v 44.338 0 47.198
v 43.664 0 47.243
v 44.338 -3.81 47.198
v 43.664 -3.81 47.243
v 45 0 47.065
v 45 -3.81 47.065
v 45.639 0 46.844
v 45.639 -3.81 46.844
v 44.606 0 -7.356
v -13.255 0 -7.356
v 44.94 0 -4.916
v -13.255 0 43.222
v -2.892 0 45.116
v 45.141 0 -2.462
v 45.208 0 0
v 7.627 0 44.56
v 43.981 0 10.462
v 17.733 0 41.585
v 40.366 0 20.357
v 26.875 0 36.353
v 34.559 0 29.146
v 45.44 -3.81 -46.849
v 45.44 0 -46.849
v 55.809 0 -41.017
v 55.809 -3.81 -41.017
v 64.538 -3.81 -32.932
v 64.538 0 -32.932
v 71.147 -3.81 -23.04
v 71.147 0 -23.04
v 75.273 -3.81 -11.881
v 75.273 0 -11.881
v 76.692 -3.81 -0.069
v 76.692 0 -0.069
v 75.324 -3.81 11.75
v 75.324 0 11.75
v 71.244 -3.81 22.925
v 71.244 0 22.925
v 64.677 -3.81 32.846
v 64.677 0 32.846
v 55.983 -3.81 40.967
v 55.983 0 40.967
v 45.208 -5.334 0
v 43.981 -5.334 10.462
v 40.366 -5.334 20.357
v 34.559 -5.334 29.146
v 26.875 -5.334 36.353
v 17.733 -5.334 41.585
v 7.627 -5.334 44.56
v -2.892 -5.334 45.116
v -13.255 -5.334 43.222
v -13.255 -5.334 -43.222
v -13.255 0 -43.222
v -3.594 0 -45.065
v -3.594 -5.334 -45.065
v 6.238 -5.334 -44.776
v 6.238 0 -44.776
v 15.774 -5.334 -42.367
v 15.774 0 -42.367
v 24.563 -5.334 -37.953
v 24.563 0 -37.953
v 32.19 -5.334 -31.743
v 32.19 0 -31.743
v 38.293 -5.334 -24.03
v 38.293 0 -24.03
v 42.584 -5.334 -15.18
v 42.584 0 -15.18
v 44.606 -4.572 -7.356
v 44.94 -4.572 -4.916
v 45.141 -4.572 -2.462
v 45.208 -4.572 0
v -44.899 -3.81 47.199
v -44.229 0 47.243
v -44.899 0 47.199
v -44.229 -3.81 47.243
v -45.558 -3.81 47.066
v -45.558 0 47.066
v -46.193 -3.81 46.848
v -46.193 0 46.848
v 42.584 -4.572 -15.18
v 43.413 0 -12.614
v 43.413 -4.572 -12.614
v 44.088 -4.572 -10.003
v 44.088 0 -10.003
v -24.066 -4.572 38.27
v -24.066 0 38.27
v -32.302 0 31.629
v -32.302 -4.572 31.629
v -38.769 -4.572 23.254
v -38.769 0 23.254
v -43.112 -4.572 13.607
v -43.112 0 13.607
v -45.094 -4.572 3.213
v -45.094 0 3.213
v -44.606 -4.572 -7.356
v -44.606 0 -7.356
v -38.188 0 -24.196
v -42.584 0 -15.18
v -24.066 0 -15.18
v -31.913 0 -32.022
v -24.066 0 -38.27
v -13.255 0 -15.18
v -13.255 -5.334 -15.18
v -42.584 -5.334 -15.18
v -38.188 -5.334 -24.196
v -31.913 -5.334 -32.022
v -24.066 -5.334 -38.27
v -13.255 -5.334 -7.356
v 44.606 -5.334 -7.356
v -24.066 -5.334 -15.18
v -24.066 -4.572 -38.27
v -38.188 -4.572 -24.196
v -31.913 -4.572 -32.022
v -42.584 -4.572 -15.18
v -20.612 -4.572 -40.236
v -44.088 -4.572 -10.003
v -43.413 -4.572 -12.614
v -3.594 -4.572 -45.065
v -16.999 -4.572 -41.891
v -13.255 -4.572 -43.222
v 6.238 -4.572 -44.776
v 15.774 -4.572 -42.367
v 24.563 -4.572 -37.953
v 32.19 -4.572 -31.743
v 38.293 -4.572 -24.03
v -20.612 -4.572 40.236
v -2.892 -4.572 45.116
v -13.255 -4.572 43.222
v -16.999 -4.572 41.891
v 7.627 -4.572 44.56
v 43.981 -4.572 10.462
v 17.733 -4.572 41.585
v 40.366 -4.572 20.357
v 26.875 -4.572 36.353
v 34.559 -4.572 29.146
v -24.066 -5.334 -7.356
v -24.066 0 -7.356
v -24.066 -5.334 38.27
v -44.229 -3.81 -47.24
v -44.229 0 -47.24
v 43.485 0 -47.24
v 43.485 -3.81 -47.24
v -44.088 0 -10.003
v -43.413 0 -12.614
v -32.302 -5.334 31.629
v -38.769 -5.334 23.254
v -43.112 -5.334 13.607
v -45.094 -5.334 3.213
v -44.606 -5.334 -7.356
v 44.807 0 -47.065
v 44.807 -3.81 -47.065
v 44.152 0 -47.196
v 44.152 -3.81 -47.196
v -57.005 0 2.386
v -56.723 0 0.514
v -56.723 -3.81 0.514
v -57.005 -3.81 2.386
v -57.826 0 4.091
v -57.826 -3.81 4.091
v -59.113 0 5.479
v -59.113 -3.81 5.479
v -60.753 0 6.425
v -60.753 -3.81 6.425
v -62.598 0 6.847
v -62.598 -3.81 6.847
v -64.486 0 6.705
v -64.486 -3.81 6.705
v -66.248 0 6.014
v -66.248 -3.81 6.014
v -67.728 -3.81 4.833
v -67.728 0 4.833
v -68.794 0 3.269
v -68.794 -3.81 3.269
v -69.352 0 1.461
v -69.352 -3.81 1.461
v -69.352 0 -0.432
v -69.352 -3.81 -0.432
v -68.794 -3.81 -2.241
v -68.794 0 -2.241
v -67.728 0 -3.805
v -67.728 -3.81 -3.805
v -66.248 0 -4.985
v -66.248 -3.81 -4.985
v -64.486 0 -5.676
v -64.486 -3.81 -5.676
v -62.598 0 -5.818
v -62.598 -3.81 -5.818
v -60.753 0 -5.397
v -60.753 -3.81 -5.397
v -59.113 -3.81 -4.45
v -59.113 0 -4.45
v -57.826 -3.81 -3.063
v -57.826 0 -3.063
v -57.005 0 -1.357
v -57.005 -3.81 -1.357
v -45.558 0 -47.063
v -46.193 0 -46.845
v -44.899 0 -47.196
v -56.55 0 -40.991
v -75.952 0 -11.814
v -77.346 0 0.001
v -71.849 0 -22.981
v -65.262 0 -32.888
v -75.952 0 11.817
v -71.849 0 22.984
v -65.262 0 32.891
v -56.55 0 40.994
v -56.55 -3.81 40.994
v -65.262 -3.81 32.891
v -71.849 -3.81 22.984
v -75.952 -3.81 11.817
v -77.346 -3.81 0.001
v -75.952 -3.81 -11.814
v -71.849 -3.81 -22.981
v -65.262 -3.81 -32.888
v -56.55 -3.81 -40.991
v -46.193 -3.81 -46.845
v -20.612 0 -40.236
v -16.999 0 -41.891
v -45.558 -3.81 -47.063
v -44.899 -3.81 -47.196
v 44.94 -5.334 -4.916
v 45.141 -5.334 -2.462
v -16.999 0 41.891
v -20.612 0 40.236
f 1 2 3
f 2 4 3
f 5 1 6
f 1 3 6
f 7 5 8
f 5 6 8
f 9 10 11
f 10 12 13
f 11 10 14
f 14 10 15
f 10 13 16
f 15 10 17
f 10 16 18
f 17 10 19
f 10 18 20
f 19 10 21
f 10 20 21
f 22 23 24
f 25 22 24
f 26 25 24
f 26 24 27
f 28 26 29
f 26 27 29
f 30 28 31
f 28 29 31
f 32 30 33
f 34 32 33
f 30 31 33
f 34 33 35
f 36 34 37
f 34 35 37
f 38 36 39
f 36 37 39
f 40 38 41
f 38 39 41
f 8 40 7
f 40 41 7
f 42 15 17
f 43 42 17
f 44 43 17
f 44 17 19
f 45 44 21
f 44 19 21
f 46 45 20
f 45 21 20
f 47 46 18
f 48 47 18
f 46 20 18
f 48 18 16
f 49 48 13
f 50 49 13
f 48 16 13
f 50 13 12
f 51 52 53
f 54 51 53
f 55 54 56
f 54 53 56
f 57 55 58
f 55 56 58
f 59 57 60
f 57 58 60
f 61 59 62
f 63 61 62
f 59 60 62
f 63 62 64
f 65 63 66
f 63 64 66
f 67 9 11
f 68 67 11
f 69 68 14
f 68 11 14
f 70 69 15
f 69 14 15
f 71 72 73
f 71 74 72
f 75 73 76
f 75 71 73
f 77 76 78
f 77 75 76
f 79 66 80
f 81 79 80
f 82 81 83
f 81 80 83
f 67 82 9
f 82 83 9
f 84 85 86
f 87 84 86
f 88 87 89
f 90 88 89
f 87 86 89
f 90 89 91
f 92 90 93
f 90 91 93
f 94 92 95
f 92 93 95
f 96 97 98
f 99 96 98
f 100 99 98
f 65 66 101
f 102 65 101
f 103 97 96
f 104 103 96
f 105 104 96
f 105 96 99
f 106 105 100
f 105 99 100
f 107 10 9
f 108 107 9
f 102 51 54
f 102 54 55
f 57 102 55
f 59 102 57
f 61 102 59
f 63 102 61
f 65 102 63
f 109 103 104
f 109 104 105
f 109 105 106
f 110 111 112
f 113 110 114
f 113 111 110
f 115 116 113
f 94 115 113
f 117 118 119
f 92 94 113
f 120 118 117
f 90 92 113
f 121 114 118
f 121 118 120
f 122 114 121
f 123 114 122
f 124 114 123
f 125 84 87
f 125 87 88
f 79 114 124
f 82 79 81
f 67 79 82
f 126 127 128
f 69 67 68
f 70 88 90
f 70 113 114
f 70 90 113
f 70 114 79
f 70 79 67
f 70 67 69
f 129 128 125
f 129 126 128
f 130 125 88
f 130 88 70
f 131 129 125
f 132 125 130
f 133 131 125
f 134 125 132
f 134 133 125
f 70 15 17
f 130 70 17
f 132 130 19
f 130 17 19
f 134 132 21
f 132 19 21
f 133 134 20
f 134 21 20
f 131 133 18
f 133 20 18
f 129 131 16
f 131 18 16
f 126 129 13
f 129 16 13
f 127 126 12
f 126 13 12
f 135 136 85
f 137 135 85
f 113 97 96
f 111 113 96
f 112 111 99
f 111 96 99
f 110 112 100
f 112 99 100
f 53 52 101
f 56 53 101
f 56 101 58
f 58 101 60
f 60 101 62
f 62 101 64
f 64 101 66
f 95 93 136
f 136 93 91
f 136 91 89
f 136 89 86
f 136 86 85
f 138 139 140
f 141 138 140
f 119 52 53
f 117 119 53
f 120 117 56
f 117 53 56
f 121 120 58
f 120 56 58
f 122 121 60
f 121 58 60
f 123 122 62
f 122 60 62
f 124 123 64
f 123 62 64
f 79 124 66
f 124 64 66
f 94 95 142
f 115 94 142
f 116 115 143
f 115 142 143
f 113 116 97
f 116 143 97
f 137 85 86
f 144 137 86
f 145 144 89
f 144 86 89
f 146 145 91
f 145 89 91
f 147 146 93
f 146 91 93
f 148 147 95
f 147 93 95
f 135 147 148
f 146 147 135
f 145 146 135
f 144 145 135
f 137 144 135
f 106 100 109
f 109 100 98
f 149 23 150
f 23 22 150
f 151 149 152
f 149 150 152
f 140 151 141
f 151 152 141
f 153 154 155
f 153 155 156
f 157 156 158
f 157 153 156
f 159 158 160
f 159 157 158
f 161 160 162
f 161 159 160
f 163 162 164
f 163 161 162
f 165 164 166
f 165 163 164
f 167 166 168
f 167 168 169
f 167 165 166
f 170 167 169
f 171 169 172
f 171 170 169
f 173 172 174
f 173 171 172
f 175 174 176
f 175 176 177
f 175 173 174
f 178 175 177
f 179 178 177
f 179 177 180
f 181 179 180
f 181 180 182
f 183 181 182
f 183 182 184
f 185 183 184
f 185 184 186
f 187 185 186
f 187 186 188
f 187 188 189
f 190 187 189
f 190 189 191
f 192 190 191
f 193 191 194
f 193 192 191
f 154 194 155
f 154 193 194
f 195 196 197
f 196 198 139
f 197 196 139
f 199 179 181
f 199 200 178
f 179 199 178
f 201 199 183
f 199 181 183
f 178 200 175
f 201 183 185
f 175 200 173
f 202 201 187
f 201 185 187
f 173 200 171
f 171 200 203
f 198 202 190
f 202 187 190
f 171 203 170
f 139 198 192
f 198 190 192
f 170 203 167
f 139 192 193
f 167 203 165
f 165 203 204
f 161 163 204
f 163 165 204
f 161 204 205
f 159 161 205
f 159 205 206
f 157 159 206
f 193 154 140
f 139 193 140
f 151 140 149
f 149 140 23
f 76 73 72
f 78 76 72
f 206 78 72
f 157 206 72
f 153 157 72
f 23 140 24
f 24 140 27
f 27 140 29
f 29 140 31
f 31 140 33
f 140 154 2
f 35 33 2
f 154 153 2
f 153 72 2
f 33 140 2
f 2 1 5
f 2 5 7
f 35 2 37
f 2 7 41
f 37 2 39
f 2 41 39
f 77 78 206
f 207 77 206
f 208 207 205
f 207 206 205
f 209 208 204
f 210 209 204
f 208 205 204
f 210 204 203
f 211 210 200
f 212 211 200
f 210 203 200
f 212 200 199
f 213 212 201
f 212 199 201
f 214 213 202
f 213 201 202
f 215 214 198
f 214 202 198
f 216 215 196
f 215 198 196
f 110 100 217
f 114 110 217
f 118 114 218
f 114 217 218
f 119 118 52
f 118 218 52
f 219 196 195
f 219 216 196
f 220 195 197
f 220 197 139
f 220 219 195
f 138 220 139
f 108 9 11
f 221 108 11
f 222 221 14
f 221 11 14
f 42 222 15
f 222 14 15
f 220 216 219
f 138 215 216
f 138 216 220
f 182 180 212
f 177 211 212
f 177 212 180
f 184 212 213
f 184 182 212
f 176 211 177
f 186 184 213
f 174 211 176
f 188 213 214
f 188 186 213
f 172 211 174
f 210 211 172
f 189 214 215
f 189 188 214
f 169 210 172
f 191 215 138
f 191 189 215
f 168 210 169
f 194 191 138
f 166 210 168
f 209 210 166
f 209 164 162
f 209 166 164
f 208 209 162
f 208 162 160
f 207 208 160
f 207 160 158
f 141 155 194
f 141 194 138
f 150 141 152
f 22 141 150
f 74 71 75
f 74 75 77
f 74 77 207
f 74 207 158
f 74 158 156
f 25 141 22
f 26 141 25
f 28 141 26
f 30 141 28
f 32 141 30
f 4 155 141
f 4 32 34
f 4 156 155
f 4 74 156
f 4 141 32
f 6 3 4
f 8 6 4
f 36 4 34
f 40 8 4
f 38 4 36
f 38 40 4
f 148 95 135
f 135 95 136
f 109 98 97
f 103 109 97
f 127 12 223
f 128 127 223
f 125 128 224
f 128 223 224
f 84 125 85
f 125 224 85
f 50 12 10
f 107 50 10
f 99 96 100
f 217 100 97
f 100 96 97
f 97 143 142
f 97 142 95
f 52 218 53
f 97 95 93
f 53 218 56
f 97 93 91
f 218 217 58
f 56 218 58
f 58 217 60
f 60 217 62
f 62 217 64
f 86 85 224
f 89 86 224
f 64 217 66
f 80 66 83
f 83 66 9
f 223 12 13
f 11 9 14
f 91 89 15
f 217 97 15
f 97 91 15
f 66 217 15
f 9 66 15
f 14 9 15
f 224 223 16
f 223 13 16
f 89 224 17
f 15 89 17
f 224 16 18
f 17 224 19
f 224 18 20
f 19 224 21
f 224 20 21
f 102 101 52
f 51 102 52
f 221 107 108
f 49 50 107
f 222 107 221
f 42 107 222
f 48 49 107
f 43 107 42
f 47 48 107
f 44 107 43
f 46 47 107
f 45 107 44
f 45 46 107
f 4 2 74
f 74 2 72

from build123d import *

# Parameters (mm, degrees)
F1_DEPTH = 5.334
F3_DEPTH = 4.572
F2_R     = 6.35
F4_DEPTH = 3.81
F5_R     = 5.08


with BuildPart() as f1:
    # F0 (on Front) → F1 (new body)
    with BuildSketch(Plane.XZ):
        with BuildLine():
            Line((-24.066022, -15.179841), (-42.583715, -15.179841))
            ThreePointArc((-42.583715, -15.179841), (-35.268128, -28.283556), (-24.066022, -38.270445))
            Line((-24.066022, -38.270445), (-24.066022, -15.179841))
        make_face()
        with BuildLine():
            ThreePointArc((-13.254738, -43.221665), (20.288746, -40.400089), (42.583715, -15.179841))
            Line((42.583715, -15.179841), (-13.254738, -15.179841))
            Line((-13.254738, -15.179841), (-13.254738, -43.221665))
        make_face()
        with BuildLine():
            ThreePointArc((44.605963, -7.355843), (45.057547, -3.690236), (45.20841, 0))
            ThreePointArc((45.20841, 0), (26.875405, 36.35262), (-13.254738, 43.221665))
            Line((-13.254738, 43.221665), (-13.254738, -7.355843))
            Line((-13.254738, -7.355843), (44.605963, -7.355843))
        make_face()
        with BuildLine():
            Line((-24.066022, -7.355843), (-24.066022, 38.270445))
            ThreePointArc((-24.066022, 38.270445), (-41.223778, 18.55803), (-44.605963, -7.355843))
            Line((-44.605963, -7.355843), (-24.066022, -7.355843))
        make_face()
    extrude(amount=F1_DEPTH)


with BuildPart() as f3:
    # F0 (on Front) → F3 (new body)
    with BuildSketch(Plane.XZ):
        with BuildLine():
            ThreePointArc((44.605963, -7.355843), (45.057547, -3.690236), (45.20841, 0))
            ThreePointArc((45.20841, 0), (26.875405, 36.35262), (-13.254738, 43.221665))
            Line((-13.254738, 43.221665), (-13.254738, -7.355843))
            Line((-13.254738, -7.355843), (44.605963, -7.355843))
        make_face()
        with BuildLine():
            Line((-13.254738, -7.355843), (-13.254738, 43.221665))
            ThreePointArc((-13.254738, 43.221665), (-18.823879, 41.103065), (-24.066022, 38.270445))
            Line((-24.066022, 38.270445), (-24.066022, -7.355843))
            Line((-24.066022, -7.355843), (-44.605963, -7.355843))
            ThreePointArc((-44.605963, -7.355843), (-43.77001, -11.313118), (-42.583715, -15.179841))
            Line((-42.583715, -15.179841), (-24.066022, -15.179841))
            Line((-24.066022, -15.179841), (-24.066022, -38.270445))
            ThreePointArc((-24.066022, -38.270445), (-18.823879, -41.103065), (-13.254738, -43.221665))
            Line((-13.254738, -43.221665), (-13.254738, -15.179841))
            Line((-13.254738, -15.179841), (42.583715, -15.179841))
            ThreePointArc((42.583715, -15.179841), (43.77001, -11.313118), (44.605963, -7.355843))
            Line((44.605963, -7.355843), (-13.254738, -7.355843))
        make_face()
        with BuildLine():
            Line((-24.066022, -7.355843), (-24.066022, 38.270445))
            ThreePointArc((-24.066022, 38.270445), (-41.223778, 18.55803), (-44.605963, -7.355843))
            Line((-44.605963, -7.355843), (-24.066022, -7.355843))
        make_face()
        with BuildLine():
            ThreePointArc((-13.254738, -43.221665), (20.288746, -40.400089), (42.583715, -15.179841))
            Line((42.583715, -15.179841), (-13.254738, -15.179841))
            Line((-13.254738, -15.179841), (-13.254738, -43.221665))
        make_face()
        with BuildLine():
            Line((-24.066022, -15.179841), (-42.583715, -15.179841))
            ThreePointArc((-42.583715, -15.179841), (-35.268128, -28.283556), (-24.066022, -38.270445))
            Line((-24.066022, -38.270445), (-24.066022, -15.179841))
        make_face()
    extrude(amount=F3_DEPTH)


with BuildPart() as f4:
    # F2 (on Front) → F4 (new body)
    with BuildSketch(Plane.XZ):
        with BuildLine():
            Line((44.663683, 47.2434), (-45.222856, 47.2434))
            ThreePointArc((-45.222856, 47.2434), (-77.345533, 0.001495), (-45.222856, -47.24041))
            Line((-45.222856, -47.24041), (44.473928, -47.24041))
            ThreePointArc((44.473928, -47.24041), (76.691658, -0.063019), (44.663683, 47.2434))
        make_face()
        with Locations((-63.07265, 0.514306)):
            Circle(F2_R, mode=Mode.SUBTRACT)
    extrude(amount=F4_DEPTH)

    # F5
    f5_edges = [f4.edges().sort_by_distance(p)[0] for p in [
        (-45.222856, -1.905, 47.2434),
        (-45.222856, -1.905, -47.24041),
        (44.473928, -1.905, -47.24041),
        (44.663683, -1.905, 47.2434),
    ]]
    fillet(f5_edges, radius=F5_R)


solid = Compound([f1.part, f3.part, f4.part])
